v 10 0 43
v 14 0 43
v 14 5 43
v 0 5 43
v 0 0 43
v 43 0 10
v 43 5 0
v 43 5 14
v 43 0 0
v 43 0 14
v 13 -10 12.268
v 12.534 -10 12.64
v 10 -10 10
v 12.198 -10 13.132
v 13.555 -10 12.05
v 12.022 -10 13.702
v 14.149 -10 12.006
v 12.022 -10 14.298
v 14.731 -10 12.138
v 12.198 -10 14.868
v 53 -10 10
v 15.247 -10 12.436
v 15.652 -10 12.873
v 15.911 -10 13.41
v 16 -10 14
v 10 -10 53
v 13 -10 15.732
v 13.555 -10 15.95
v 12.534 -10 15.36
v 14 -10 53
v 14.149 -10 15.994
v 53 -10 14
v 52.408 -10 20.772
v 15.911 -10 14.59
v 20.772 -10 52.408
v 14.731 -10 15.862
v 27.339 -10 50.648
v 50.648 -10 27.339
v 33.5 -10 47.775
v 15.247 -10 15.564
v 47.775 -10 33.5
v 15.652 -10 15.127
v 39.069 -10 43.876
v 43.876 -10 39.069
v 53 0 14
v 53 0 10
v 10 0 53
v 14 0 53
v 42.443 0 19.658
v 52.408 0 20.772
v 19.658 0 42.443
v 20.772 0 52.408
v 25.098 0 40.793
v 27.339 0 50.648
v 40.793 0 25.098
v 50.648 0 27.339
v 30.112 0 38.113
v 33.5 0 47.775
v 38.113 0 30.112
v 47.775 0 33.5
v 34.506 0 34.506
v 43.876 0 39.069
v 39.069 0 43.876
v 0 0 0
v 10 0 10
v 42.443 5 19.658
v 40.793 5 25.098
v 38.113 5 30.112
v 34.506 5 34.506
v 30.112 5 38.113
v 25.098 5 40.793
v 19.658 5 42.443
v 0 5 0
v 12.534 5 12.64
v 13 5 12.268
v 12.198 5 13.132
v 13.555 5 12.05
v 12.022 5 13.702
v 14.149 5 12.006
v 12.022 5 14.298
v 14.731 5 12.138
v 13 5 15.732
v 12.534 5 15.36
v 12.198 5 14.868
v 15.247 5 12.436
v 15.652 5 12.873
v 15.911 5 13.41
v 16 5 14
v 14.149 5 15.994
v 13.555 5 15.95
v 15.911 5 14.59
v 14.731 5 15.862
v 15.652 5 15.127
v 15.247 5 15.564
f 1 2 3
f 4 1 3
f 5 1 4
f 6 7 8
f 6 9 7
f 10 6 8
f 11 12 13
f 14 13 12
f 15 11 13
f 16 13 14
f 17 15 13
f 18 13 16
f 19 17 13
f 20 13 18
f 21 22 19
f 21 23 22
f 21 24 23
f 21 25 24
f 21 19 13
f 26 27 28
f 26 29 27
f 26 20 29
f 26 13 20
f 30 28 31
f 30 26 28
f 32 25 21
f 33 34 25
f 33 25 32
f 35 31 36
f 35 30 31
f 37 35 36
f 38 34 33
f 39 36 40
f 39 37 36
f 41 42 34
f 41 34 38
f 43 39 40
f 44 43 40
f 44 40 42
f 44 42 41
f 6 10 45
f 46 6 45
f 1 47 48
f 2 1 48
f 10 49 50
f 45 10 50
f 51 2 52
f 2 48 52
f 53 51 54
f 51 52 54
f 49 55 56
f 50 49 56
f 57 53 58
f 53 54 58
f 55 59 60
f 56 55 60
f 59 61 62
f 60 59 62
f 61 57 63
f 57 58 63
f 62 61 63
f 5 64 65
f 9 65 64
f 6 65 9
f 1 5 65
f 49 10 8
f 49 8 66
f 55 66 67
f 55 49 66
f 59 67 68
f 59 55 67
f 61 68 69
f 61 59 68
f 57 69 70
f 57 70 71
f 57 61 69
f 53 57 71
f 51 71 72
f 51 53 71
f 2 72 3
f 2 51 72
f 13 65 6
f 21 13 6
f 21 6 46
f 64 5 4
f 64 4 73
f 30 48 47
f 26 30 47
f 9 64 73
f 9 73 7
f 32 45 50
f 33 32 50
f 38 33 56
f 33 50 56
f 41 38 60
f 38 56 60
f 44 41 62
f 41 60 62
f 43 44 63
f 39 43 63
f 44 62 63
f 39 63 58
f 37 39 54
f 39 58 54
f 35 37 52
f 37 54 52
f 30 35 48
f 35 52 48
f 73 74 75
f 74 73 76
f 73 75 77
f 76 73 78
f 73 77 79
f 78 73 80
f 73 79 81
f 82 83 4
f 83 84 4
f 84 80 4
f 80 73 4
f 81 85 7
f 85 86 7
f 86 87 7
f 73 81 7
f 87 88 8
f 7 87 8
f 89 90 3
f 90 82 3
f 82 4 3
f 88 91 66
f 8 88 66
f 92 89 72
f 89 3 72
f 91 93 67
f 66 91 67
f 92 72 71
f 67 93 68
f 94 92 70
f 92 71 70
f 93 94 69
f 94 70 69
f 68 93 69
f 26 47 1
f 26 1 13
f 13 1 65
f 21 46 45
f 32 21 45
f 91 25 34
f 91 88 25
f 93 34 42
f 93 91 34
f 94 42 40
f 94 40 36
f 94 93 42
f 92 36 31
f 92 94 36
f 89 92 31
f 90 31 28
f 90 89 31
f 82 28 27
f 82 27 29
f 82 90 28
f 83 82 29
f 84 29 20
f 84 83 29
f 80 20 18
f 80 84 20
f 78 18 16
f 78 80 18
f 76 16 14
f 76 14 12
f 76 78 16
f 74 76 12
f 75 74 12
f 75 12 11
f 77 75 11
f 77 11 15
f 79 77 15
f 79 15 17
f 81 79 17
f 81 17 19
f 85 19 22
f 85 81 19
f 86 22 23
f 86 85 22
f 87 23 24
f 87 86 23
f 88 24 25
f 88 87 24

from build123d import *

# Parameters (mm, degrees)
F1_DEPTH      = 5
F0_R          = 2
F2_DEPTH      = 10
F2_DEPTH_BACK = 5
F3_DEPTH      = 10


with BuildPart() as f1:
    # F0 (on Front) → F1 (new body)
    with BuildSketch(Plane.XZ):
        Polygon((0, 43), (0, 0), (43, 0), (43, 10), (10, 10), (10, 43), align=None)
    extrude(amount=-F1_DEPTH)

    # F0 (on Front) → F2 (join, two sides)
    with BuildSketch(Plane.XZ) as f2_sk:
        with BuildLine():
            Line((10, 10), (43, 10))
            Line((43, 10), (43, 14))
            ThreePointArc((43, 14), (34.506097, 34.506097), (14, 43))
            Line((14, 43), (10, 43))
            Line((10, 43), (10, 10))
        make_face()
        with Locations((14, 14)):
            Circle(F0_R, mode=Mode.SUBTRACT)
    extrude(amount=F2_DEPTH)
    extrude(f2_sk.sketch, amount=-F2_DEPTH_BACK)

    # F0 (on Front) → F3 (join)
    with BuildSketch(Plane.XZ):
        with BuildLine():
            Line((43, 14), (43, 10))
            Line((43, 10), (53, 10))
            Line((53, 10), (53, 14))
            ThreePointArc((53, 14), (41.577164, 41.577164), (14, 53))
            Line((14, 53), (10, 53))
            Line((10, 53), (10, 43))
            Line((10, 43), (14, 43))
            ThreePointArc((14, 43), (34.506097, 34.506097), (43, 14))
        make_face()
    extrude(amount=F3_DEPTH)


solid = f1.part
